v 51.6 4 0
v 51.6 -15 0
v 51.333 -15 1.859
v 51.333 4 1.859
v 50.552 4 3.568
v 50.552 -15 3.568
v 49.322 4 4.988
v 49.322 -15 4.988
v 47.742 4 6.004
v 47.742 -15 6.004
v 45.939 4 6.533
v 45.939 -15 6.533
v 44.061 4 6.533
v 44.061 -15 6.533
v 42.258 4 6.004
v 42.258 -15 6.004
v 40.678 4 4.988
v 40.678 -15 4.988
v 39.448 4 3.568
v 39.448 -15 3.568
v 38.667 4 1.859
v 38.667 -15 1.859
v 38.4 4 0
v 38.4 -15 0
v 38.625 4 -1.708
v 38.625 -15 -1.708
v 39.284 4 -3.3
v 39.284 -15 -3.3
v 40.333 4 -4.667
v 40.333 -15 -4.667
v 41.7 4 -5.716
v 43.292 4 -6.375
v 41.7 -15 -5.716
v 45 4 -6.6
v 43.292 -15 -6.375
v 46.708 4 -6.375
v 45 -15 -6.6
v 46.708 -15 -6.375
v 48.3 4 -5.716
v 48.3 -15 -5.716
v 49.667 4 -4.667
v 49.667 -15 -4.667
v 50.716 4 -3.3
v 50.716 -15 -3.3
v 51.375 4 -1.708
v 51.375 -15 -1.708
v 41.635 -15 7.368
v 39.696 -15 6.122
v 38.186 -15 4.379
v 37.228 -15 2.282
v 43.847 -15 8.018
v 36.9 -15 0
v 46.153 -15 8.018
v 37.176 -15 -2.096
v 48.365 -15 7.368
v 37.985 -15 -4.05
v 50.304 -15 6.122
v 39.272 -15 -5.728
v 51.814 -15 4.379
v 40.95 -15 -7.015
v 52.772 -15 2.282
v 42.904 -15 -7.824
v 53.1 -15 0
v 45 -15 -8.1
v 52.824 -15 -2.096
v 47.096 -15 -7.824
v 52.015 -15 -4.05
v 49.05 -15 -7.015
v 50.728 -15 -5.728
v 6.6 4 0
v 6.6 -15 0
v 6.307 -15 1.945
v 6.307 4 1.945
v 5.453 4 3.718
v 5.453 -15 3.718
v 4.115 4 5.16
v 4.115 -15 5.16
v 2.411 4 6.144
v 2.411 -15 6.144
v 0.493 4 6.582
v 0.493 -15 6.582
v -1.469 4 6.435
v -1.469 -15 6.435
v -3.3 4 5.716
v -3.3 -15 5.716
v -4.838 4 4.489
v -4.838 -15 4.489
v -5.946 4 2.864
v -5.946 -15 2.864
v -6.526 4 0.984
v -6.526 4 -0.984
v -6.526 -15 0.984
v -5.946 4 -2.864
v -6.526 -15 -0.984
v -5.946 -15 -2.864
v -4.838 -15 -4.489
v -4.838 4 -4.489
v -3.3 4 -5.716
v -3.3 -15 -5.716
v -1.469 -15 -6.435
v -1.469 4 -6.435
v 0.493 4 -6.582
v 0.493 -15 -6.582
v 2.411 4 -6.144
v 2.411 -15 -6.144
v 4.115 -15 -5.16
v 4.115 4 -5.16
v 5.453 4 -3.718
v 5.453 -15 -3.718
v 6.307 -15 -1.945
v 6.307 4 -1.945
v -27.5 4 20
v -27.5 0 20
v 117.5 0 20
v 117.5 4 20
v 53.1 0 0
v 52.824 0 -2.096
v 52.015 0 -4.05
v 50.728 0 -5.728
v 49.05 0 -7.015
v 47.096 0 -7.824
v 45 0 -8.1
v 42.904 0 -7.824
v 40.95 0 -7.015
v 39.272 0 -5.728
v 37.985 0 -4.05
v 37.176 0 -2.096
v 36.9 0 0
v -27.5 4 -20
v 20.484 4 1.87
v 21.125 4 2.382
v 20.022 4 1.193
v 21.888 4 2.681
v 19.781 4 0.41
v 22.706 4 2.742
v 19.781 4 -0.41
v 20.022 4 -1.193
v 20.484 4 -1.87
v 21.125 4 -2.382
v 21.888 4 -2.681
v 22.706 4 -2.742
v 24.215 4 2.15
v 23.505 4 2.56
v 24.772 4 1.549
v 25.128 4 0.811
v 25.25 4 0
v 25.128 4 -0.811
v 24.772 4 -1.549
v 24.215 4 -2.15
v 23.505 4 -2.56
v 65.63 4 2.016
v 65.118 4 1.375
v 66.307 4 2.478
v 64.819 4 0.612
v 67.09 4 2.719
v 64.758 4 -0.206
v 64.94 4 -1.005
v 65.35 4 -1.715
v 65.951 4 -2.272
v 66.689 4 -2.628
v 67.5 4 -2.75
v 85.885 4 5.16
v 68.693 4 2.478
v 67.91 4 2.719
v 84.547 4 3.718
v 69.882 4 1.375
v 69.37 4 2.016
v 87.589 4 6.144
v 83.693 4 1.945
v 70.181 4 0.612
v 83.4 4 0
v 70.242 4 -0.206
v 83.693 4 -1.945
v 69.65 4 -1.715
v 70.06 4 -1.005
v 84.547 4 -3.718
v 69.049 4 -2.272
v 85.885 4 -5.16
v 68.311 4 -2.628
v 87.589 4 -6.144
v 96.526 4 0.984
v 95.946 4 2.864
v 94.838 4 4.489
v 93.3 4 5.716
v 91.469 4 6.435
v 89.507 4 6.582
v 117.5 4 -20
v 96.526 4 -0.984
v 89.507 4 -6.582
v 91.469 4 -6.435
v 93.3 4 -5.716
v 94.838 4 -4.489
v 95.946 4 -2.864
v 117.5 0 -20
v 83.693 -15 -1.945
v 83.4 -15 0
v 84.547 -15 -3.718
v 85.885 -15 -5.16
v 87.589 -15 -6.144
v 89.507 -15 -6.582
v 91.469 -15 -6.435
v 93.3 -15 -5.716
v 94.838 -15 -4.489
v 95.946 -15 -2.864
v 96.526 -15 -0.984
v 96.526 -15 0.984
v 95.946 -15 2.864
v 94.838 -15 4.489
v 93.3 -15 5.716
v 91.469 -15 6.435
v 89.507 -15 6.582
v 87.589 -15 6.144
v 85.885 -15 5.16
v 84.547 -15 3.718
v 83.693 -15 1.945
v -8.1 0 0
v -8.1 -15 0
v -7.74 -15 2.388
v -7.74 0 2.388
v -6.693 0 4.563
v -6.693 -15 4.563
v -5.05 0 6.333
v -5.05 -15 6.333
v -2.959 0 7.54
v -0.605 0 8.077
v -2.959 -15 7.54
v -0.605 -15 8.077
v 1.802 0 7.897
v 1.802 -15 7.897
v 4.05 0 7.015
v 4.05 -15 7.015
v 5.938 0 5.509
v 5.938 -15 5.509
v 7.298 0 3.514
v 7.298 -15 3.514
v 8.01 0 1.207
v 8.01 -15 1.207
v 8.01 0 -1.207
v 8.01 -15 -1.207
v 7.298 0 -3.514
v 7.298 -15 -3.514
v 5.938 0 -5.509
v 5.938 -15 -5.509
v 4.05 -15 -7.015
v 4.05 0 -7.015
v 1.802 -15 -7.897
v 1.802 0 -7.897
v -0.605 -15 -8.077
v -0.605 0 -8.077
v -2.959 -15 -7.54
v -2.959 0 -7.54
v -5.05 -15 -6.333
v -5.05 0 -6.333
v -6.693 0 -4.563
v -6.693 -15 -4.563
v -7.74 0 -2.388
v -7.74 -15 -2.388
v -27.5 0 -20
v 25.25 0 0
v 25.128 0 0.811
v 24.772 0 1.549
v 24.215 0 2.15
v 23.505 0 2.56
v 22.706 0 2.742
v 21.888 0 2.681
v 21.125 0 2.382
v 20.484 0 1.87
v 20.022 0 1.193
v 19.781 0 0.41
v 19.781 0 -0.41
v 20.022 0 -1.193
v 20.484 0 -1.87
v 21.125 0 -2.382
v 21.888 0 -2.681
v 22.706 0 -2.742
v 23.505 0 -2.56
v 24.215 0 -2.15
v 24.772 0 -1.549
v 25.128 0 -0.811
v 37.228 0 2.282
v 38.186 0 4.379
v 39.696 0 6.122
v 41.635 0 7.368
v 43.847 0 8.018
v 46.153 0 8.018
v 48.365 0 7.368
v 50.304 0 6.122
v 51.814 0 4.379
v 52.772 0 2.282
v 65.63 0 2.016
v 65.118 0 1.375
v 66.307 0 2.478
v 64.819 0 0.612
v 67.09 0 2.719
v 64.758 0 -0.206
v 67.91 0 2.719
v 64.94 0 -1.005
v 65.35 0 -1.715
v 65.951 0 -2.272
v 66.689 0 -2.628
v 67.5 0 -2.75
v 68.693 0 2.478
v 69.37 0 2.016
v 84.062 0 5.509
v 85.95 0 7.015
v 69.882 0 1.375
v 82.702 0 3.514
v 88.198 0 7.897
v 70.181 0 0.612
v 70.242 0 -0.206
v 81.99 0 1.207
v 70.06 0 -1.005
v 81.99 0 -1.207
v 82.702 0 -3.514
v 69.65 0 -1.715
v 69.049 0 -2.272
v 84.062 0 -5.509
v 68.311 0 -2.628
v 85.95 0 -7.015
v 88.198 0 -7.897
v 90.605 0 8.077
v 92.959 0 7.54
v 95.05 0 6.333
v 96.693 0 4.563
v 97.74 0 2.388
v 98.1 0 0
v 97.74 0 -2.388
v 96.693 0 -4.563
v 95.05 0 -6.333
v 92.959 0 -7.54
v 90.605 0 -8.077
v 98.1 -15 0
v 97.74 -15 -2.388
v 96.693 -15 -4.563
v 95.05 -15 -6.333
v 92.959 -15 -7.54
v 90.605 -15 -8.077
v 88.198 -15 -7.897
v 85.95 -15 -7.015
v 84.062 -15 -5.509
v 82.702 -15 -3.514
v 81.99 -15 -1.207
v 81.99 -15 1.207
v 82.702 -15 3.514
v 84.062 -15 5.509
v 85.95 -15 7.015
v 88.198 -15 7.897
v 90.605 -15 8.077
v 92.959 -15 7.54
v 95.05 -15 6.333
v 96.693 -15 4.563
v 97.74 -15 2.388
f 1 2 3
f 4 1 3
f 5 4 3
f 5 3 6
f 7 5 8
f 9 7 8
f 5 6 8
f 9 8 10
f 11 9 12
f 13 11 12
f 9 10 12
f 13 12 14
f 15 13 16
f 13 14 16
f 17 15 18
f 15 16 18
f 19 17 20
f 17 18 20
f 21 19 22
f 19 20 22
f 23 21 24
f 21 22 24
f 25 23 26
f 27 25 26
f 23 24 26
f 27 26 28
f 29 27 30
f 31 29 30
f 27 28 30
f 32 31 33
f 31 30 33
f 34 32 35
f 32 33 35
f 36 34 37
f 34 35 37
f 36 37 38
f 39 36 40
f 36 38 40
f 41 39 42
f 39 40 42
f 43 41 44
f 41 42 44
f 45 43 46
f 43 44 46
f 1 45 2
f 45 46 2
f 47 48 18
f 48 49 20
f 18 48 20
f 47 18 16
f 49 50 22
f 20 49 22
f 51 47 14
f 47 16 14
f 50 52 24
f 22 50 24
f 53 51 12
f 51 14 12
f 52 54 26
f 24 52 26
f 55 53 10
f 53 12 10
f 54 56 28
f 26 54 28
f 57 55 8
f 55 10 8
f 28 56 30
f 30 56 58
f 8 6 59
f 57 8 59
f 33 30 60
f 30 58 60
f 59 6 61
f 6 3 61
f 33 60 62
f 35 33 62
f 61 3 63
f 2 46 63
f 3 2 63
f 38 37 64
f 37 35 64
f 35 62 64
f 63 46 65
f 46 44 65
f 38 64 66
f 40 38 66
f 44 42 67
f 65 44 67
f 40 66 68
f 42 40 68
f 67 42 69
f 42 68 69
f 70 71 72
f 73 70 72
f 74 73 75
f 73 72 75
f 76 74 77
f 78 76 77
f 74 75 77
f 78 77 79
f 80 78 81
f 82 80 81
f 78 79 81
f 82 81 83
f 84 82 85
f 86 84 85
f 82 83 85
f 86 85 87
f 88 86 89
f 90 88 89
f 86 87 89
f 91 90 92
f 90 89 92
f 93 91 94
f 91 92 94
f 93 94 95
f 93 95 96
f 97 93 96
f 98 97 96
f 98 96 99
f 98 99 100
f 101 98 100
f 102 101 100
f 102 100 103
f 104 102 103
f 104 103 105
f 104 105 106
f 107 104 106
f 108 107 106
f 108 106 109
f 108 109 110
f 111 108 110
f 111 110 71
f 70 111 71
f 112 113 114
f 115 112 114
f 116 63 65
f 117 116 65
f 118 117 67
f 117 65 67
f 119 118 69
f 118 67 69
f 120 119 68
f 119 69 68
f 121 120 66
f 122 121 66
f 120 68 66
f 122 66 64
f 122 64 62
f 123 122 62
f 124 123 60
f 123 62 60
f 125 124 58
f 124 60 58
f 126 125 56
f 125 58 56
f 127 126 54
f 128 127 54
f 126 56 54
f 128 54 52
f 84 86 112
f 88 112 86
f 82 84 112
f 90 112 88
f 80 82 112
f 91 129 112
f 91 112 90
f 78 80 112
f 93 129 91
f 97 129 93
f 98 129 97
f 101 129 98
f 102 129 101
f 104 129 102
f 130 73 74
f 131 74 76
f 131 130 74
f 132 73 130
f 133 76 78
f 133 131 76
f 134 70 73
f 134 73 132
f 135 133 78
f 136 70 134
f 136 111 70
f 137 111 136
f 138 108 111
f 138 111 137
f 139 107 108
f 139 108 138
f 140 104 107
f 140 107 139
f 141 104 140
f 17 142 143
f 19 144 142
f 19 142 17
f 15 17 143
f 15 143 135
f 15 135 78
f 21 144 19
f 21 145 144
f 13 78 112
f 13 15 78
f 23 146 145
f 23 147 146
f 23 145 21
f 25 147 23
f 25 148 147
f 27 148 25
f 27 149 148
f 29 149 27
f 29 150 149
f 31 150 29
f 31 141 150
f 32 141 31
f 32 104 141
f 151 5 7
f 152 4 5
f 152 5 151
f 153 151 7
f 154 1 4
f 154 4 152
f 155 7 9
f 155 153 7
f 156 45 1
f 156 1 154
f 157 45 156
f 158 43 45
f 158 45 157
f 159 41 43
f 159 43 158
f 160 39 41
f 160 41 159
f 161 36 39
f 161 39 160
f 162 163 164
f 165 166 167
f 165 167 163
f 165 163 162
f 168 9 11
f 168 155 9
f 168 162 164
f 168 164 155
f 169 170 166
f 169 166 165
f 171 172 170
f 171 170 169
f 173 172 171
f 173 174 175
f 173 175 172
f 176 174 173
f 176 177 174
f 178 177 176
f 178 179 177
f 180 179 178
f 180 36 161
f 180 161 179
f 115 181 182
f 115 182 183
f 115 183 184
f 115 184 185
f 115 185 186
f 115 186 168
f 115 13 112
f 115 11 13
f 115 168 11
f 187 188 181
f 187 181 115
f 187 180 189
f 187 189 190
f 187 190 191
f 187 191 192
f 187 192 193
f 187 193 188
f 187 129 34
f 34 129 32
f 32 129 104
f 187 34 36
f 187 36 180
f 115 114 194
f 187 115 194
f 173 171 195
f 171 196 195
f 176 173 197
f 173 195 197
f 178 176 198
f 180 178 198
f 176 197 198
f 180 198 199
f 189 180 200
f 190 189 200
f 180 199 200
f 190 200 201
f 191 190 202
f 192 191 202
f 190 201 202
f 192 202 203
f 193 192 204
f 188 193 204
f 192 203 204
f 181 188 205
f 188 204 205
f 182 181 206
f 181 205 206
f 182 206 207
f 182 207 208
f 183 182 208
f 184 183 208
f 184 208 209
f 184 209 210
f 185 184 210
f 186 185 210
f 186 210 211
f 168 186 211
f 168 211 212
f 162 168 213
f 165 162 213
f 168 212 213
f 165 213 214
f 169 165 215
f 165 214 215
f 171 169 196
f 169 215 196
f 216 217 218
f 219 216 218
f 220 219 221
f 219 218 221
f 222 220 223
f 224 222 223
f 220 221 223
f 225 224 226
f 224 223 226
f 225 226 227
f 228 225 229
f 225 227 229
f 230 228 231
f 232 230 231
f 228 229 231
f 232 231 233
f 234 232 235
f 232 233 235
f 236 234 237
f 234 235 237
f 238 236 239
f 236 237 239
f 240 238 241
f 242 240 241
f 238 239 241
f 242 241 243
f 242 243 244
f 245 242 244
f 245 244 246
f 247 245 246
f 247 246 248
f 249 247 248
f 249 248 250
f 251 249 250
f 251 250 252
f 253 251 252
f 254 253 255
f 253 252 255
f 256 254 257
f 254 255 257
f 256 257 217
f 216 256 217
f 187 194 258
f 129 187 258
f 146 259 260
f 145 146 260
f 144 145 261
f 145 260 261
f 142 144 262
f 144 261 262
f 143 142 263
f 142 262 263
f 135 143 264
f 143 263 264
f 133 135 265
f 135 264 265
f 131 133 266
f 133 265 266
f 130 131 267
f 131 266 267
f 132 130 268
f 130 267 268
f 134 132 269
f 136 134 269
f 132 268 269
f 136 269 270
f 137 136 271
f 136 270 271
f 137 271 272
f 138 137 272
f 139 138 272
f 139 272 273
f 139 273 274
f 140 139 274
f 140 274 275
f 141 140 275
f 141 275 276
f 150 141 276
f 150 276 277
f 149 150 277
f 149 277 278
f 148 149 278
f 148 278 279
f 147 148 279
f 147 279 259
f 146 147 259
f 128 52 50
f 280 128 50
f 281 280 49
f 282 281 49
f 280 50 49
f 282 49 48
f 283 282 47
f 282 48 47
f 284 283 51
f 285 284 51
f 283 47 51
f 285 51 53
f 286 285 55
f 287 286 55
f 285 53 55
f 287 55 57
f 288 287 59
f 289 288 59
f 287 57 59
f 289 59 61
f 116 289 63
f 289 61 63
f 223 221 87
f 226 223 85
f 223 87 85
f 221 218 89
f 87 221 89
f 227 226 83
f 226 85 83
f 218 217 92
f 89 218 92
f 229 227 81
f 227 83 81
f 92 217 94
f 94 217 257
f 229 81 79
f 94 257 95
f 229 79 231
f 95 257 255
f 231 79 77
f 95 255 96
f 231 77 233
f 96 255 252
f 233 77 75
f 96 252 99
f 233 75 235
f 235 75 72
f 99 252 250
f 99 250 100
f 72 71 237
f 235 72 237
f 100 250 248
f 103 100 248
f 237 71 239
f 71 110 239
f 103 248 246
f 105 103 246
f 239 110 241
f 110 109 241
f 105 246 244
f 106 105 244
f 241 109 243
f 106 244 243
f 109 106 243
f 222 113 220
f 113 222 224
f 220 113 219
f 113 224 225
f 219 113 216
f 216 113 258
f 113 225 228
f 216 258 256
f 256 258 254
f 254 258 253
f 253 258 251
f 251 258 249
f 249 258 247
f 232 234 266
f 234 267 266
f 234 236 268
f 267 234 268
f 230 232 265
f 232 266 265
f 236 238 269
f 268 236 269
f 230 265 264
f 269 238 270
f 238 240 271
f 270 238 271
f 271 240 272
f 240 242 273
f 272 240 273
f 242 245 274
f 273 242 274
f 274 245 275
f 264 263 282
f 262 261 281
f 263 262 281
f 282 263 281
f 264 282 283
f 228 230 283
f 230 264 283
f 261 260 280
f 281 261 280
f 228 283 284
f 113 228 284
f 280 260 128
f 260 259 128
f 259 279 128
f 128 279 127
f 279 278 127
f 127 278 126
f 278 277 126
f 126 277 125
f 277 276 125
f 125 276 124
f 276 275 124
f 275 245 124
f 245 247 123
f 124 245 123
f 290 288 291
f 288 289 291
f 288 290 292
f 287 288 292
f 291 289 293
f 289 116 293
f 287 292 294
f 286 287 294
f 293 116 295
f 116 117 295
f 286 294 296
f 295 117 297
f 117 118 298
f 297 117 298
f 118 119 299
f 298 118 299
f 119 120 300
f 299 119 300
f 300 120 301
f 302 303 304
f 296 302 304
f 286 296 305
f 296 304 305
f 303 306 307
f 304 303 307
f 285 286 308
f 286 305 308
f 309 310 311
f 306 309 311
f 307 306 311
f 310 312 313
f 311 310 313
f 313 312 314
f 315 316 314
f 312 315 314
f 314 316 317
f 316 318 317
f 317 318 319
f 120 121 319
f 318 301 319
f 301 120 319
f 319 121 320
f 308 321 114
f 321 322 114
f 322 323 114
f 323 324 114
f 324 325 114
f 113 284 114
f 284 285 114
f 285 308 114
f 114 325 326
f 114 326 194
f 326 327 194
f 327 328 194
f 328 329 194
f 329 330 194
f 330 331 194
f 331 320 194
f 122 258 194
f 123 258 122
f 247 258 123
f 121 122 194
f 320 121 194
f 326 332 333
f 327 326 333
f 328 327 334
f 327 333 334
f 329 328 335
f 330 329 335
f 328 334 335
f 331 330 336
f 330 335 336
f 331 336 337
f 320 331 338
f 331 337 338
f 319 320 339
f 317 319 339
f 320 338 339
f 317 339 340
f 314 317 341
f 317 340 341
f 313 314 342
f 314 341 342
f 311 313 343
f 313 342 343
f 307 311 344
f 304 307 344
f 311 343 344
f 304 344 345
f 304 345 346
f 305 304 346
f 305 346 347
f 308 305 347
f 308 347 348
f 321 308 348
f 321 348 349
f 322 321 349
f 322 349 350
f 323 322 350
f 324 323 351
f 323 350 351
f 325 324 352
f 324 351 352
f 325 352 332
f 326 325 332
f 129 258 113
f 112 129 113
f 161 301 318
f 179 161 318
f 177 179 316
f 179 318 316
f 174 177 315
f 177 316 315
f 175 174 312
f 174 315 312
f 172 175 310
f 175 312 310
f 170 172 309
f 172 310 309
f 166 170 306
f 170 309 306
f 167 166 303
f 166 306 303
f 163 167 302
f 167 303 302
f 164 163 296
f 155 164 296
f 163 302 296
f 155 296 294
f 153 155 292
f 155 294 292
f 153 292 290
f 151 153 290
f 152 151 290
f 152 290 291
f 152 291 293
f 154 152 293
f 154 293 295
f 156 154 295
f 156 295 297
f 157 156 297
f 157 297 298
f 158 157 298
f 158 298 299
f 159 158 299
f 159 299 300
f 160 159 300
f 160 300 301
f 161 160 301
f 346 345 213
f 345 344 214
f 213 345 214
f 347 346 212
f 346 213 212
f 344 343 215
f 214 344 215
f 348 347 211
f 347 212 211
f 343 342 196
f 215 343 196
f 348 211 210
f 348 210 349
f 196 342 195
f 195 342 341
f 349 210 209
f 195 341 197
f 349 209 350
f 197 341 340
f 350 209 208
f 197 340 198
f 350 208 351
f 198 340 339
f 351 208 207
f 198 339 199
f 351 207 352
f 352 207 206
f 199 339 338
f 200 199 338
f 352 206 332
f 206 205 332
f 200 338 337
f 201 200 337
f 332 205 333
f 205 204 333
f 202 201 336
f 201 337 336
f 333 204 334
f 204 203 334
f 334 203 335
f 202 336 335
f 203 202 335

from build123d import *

# Parameters (mm, degrees)
BOSS_EXTRUDE3_DEPTH = 4
BOSS_EXTRUDE4_START = -15
BOSS_EXTRUDE4_DEPTH = 15
SKETCH3_R           = 2.75
CUT_EXTRUDE1_DEPTH  = 74


with BuildPart() as part:
    # Sketch2 → Boss-Extrude3 (new body)
    with BuildSketch(Plane(origin=(0, 0, 0), x_dir=(1, 0, 0), z_dir=(0, 1, 0))):
        with BuildLine():
            Line((45, 20), (-27.5, 20))
            Line((-27.5, 20), (-27.5, 0))
            Line((-27.5, 0), (-8.1, 0))
            ThreePointArc((-8.1, 0), (0, 8.1), (8.1, 0))
            Line((8.1, 0), (36.9, 0))
            ThreePointArc((36.9, 0), (39.272435072, 5.727564928), (45, 8.1))
            Line((45, 8.1), (45, 20))
        make_face()
        with BuildLine():
            ThreePointArc((8.1, 0), (0, 8.1), (-8.1, 0))
            Line((-8.1, 0), (-6.6, 0))
            ThreePointArc((-6.6, 0), (0, 6.6), (6.6, 0))
            Line((6.6, 0), (8.1, 0))
        make_face()
        with BuildLine():
            Line((-6.6, 0), (-8.1, 0))
            ThreePointArc((-8.1, 0), (0, -8.1), (8.1, 0))
            Line((8.1, 0), (6.6, 0))
            ThreePointArc((6.6, 0), (0, -6.6), (-6.6, 0))
        make_face()
        with BuildLine():
            ThreePointArc((53.1, 0), (50.727564928, 5.727564928), (45, 8.1))
            Line((45, 8.1), (45, 6.6))
            ThreePointArc((45, 6.6), (49.666904756, 4.666904756), (51.6, 0))
            Line((51.6, 0), (53.1, 0))
        make_face()
        with BuildLine():
            Line((45, 6.6), (45, 8.1))
            ThreePointArc((45, 8.1), (39.272435072, 5.727564928), (36.9, 0))
            Line((36.9, 0), (38.4, 0))
            ThreePointArc((38.4, 0), (40.333095244, 4.666904756), (45, 6.6))
        make_face()
        with BuildLine():
            ThreePointArc((36.9, 0), (45, -8.1), (53.1, 0))
            Line((53.1, 0), (51.6, 0))
            ThreePointArc((51.6, 0), (45, -6.6), (38.4, 0))
            Line((38.4, 0), (36.9, 0))
        make_face()
        with BuildLine():
            ThreePointArc((81.9, 0), (90, -8.1), (98.1, 0))
            Line((98.1, 0), (96.6, 0))
            ThreePointArc((96.6, 0), (90, -6.6), (83.4, 0))
            Line((83.4, 0), (81.9, 0))
        make_face()
        with BuildLine():
            Line((96.6, 0), (98.1, 0))
            ThreePointArc((98.1, 0), (90, 8.1), (81.9, 0))
            Line((81.9, 0), (83.4, 0))
            ThreePointArc((83.4, 0), (90, 6.6), (96.6, 0))
        make_face()
        with BuildLine():
            Line((117.5, 20), (45, 20))
            Line((45, 20), (45, 8.1))
            ThreePointArc((45, 8.1), (50.727564928, 5.727564928), (53.1, 0))
            Line((53.1, 0), (81.9, 0))
            ThreePointArc((81.9, 0), (90, 8.1), (98.1, 0))
            Line((98.1, 0), (117.5, 0))
            Line((117.5, 0), (117.5, 20))
        make_face()
        with BuildLine():
            Line((-8.1, 0), (-27.5, 0))
            Line((-27.5, 0), (-27.5, -20))
            Line((-27.5, -20), (117.5, -20))
            Line((117.5, -20), (117.5, 0))
            Line((117.5, 0), (98.1, 0))
            ThreePointArc((98.1, 0), (90, -8.1), (81.9, 0))
            Line((81.9, 0), (53.1, 0))
            ThreePointArc((53.1, 0), (45, -8.1), (36.9, 0))
            Line((36.9, 0), (8.1, 0))
            ThreePointArc((8.1, 0), (0, -8.1), (-8.1, 0))
        make_face()
    extrude(amount=BOSS_EXTRUDE3_DEPTH)

    # Sketch2<5> → Boss-Extrude4 (add)
    with BuildSketch(Plane(origin=(0, 0, 0), x_dir=(1, 0, 0), z_dir=(0, 1, 0)).offset(BOSS_EXTRUDE4_START)):
        with BuildLine():
            ThreePointArc((8.1, 0), (0, 8.1), (-8.1, 0))
            Line((-8.1, 0), (-6.6, 0))
            ThreePointArc((-6.6, 0), (0, 6.6), (6.6, 0))
            Line((6.6, 0), (8.1, 0))
        make_face()
        with BuildLine():
            Line((-6.6, 0), (-8.1, 0))
            ThreePointArc((-8.1, 0), (0, -8.1), (8.1, 0))
            Line((8.1, 0), (6.6, 0))
            ThreePointArc((6.6, 0), (0, -6.6), (-6.6, 0))
        make_face()
        with BuildLine():
            ThreePointArc((53.1, 0), (50.727564928, 5.727564928), (45, 8.1))
            Line((45, 8.1), (45, 6.6))
            ThreePointArc((45, 6.6), (49.666904756, 4.666904756), (51.6, 0))
            Line((51.6, 0), (53.1, 0))
        make_face()
        with BuildLine():
            Line((45, 6.6), (45, 8.1))
            ThreePointArc((45, 8.1), (39.272435072, 5.727564928), (36.9, 0))
            Line((36.9, 0), (38.4, 0))
            ThreePointArc((38.4, 0), (40.333095244, 4.666904756), (45, 6.6))
        make_face()
        with BuildLine():
            ThreePointArc((36.9, 0), (45, -8.1), (53.1, 0))
            Line((53.1, 0), (51.6, 0))
            ThreePointArc((51.6, 0), (45, -6.6), (38.4, 0))
            Line((38.4, 0), (36.9, 0))
        make_face()
        with BuildLine():
            ThreePointArc((81.9, 0), (90, -8.1), (98.1, 0))
            Line((98.1, 0), (96.6, 0))
            ThreePointArc((96.6, 0), (90, -6.6), (83.4, 0))
            Line((83.4, 0), (81.9, 0))
        make_face()
        with BuildLine():
            Line((96.6, 0), (98.1, 0))
            ThreePointArc((98.1, 0), (90, 8.1), (81.9, 0))
            Line((81.9, 0), (83.4, 0))
            ThreePointArc((83.4, 0), (90, 6.6), (96.6, 0))
        make_face()
    extrude(amount=BOSS_EXTRUDE4_DEPTH)

    # Sketch3 → Cut-Extrude1 (cut)
    with BuildSketch(Plane.XZ):
        with BuildLine():
            ThreePointArc((19.75, 0), (22.5, -2.75), (25.25, 0))
            Line((25.25, 0), (19.75, 0))
        make_face()
        with BuildLine():
            Line((19.75, 0), (25.25, 0))
            ThreePointArc((25.25, 0), (22.5, 2.75), (19.75, 0))
        make_face()
        with Locations(Location((67.5, 0, 0), (0, 0, 270))):
            Circle(SKETCH3_R)
    extrude(amount=-CUT_EXTRUDE1_DEPTH, mode=Mode.SUBTRACT)


solid = part.part
